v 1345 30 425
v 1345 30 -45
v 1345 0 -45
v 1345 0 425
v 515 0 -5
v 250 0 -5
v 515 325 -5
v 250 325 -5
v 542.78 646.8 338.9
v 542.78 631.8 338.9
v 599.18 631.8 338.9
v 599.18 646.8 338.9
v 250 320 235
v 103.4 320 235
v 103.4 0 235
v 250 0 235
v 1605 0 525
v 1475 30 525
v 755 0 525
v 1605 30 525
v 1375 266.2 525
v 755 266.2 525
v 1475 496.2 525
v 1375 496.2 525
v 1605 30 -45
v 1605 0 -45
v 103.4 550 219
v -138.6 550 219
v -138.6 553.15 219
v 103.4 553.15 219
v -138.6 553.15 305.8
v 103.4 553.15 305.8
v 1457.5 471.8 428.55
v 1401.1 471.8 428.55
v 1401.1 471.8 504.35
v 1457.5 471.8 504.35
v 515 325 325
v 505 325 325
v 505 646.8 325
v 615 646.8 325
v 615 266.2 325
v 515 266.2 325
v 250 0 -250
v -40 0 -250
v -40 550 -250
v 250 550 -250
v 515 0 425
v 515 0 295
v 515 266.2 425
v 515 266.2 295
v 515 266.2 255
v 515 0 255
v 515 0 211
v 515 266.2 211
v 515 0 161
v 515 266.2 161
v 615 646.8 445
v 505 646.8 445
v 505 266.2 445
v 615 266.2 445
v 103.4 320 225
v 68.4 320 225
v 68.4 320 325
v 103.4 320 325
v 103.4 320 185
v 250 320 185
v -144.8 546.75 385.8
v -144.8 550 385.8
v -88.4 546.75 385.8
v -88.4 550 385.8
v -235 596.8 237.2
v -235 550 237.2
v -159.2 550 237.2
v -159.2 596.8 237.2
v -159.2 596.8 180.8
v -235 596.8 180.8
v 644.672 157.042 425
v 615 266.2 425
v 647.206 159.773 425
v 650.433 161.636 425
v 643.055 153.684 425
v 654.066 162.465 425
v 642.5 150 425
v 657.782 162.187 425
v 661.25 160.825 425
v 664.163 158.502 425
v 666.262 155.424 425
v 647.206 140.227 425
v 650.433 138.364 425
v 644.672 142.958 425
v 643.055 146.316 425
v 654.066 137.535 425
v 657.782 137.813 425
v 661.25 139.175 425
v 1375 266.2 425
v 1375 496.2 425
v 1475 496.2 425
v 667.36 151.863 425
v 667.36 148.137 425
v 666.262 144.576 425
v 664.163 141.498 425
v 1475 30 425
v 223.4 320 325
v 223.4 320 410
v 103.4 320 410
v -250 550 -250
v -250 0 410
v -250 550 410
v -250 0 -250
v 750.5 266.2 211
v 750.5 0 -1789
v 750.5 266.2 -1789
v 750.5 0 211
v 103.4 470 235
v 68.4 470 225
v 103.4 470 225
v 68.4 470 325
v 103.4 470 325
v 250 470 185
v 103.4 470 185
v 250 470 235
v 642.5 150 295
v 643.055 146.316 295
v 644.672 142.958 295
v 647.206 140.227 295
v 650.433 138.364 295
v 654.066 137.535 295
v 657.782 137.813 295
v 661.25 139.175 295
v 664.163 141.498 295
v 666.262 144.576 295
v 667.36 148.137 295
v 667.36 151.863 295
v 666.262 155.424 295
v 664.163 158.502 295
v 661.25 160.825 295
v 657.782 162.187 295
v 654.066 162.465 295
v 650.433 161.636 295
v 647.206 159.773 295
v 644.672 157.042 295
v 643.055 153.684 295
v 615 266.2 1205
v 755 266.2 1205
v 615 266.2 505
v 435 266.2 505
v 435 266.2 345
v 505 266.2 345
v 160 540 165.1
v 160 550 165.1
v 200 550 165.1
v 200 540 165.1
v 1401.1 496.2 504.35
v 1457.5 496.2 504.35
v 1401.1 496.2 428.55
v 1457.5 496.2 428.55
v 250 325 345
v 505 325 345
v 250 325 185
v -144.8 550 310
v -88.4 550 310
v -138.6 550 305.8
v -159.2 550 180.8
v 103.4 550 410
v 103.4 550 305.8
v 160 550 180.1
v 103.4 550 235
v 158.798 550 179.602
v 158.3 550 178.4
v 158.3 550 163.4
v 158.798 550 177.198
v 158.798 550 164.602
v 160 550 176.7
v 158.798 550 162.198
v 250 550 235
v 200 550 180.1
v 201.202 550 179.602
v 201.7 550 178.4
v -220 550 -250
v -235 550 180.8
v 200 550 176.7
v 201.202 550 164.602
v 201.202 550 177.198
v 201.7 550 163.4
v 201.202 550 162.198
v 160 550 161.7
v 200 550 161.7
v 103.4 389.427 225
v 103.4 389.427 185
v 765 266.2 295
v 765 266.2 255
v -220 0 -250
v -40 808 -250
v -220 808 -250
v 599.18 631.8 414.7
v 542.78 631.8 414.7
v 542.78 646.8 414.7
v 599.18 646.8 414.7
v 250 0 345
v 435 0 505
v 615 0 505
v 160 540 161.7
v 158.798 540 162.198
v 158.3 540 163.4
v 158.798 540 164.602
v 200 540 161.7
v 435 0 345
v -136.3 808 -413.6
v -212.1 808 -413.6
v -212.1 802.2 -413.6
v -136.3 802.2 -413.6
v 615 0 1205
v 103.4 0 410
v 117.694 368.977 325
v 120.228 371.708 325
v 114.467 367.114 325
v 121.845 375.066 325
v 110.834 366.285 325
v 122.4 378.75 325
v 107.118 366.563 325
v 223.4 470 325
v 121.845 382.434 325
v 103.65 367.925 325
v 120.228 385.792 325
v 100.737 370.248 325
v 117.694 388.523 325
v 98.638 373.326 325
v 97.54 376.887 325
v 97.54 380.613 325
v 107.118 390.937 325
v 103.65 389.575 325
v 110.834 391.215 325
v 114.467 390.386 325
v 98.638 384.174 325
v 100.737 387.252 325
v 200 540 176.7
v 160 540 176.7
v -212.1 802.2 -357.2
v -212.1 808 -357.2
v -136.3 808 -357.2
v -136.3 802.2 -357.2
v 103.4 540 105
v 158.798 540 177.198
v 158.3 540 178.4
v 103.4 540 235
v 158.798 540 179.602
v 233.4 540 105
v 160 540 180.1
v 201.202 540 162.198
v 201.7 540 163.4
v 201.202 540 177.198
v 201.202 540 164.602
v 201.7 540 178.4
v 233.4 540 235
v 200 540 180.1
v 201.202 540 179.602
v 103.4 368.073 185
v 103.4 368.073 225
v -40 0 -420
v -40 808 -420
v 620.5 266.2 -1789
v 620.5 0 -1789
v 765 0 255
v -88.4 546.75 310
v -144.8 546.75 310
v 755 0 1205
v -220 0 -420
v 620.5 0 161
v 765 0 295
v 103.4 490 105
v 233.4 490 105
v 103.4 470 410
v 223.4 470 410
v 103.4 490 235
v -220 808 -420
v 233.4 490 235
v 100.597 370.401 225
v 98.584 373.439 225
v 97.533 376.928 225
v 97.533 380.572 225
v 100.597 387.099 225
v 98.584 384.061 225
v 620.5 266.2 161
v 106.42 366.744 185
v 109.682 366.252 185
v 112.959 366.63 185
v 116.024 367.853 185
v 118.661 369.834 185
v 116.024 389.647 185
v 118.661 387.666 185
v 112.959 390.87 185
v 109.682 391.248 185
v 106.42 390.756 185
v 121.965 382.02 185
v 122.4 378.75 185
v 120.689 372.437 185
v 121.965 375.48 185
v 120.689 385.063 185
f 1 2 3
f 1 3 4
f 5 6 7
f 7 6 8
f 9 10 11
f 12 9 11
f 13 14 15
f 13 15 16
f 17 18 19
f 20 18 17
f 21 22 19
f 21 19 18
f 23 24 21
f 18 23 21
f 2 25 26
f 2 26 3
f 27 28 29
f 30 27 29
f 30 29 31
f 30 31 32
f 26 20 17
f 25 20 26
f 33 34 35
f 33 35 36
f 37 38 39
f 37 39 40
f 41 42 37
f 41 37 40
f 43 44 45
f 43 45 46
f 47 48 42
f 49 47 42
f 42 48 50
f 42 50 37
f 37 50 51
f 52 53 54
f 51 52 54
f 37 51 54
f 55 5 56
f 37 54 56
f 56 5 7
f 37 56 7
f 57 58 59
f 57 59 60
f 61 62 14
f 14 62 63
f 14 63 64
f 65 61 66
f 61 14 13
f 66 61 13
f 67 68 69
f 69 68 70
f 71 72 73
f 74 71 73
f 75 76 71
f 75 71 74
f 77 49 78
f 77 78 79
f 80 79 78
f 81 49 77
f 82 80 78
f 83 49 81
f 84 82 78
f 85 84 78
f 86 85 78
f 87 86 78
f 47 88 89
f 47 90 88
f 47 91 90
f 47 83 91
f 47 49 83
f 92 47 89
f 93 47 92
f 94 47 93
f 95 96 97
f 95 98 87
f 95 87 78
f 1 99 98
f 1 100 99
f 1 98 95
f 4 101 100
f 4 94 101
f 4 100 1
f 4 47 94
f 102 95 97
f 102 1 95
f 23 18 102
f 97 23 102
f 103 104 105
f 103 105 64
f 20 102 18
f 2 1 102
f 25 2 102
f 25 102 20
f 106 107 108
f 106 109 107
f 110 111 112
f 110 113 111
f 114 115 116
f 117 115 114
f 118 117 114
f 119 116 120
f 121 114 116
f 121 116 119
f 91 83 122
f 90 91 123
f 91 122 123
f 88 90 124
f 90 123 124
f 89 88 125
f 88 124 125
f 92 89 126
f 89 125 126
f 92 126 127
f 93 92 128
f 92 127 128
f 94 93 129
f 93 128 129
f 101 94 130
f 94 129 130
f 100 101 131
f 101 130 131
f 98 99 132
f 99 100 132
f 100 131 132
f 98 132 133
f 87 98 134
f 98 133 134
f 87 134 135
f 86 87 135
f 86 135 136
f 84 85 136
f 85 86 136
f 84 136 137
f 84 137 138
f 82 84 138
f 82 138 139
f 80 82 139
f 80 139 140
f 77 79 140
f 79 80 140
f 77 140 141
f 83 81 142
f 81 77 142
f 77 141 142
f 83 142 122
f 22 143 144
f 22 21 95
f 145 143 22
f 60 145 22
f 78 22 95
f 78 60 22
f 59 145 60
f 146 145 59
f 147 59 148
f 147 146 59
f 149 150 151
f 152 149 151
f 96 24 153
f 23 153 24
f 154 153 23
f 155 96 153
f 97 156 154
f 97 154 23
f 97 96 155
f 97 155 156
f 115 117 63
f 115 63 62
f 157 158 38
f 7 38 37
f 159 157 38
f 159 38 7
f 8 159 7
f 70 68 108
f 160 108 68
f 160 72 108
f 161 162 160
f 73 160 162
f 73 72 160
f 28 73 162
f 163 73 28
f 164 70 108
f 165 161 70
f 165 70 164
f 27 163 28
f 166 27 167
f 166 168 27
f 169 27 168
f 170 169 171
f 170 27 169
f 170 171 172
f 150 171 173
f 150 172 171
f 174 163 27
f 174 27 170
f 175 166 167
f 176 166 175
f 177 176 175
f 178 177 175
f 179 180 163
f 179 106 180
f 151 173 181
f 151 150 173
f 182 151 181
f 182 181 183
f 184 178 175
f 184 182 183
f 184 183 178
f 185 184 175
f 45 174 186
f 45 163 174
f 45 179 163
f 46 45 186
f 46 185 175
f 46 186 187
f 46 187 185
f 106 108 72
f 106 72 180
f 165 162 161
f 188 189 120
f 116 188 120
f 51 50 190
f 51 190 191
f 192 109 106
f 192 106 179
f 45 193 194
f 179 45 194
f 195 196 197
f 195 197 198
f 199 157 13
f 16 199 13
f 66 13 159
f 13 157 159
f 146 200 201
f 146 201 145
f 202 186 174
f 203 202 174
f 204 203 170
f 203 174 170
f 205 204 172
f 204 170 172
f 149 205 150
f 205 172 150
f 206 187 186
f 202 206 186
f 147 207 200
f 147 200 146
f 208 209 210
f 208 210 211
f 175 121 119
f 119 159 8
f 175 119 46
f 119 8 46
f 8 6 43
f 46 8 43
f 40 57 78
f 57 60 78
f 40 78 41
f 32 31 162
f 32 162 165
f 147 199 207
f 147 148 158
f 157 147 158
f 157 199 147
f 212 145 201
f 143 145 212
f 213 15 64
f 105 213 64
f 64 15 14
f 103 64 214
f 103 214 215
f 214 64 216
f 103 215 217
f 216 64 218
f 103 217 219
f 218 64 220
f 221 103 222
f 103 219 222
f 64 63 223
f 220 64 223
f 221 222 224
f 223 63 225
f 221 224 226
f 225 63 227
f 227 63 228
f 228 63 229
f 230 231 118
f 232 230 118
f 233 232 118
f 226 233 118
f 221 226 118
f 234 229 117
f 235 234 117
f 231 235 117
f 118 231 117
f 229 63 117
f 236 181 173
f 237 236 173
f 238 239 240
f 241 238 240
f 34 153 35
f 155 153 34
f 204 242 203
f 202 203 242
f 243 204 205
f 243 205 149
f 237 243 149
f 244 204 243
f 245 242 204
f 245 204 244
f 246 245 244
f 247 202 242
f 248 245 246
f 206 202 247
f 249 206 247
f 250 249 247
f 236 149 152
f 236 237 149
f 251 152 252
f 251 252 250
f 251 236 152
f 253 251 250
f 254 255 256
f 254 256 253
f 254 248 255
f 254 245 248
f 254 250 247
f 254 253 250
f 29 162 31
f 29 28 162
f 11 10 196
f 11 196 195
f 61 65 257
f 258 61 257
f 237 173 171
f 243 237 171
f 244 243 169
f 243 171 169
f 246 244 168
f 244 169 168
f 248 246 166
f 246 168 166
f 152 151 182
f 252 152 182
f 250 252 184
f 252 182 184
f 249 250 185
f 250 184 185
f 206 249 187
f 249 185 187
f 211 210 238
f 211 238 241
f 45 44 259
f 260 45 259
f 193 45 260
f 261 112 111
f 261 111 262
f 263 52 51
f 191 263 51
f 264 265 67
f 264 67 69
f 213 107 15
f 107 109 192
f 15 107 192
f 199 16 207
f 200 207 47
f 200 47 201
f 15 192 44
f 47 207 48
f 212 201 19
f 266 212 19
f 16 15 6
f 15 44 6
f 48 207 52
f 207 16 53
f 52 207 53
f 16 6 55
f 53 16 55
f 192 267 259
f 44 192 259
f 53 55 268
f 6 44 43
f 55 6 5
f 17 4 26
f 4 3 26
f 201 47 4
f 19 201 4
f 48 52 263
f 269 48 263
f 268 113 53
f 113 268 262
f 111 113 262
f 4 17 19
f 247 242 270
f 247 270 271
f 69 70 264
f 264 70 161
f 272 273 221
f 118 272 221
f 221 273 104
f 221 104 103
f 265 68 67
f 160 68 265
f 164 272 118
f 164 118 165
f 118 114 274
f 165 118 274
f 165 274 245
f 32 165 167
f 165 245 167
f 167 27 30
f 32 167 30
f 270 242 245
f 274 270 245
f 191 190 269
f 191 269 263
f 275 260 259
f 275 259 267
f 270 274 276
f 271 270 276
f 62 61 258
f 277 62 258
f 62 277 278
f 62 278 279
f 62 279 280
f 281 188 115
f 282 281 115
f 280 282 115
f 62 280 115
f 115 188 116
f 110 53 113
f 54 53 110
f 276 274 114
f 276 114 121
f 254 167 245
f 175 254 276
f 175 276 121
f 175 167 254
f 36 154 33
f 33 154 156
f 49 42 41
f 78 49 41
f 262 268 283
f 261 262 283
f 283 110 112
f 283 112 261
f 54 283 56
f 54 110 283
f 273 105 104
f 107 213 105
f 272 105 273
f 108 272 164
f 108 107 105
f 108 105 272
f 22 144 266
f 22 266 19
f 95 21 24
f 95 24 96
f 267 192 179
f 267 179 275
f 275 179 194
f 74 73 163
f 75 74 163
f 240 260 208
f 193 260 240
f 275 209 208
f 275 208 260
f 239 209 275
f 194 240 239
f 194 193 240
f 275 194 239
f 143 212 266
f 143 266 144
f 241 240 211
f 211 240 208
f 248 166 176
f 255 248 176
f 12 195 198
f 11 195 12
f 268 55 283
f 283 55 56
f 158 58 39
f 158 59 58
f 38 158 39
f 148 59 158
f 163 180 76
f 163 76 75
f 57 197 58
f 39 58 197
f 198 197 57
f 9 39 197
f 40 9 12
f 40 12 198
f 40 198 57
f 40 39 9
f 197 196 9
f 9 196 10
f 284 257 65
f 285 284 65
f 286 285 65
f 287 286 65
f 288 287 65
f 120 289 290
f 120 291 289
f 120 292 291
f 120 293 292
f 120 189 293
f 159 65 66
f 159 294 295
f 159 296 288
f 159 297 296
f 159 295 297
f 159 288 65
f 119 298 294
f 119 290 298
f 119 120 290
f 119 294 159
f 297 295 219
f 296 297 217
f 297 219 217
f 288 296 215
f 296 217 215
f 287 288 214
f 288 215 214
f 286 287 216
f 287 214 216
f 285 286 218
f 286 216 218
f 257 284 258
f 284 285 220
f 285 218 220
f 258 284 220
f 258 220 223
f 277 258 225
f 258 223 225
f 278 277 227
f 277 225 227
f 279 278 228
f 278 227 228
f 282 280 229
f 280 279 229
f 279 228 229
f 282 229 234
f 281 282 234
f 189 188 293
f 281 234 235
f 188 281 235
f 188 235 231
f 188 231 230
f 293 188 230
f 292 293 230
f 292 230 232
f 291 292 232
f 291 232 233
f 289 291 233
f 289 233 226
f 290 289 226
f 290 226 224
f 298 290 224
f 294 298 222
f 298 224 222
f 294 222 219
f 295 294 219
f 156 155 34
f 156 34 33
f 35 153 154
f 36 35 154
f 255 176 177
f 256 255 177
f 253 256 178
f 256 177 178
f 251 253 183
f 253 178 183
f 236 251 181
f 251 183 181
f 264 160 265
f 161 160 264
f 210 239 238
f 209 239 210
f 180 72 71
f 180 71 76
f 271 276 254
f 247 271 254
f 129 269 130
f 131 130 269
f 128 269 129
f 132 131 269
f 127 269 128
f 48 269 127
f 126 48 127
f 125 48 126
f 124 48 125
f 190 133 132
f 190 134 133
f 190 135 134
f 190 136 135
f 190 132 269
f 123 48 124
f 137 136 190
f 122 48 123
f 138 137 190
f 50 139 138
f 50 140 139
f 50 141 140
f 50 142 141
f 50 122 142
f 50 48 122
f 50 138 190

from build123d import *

# Parameters (mm, degrees)
SKETCH1_W            = 500
SKETCH1_H            = 500
BOSS_EXTRUDE1_DEPTH  = 550
SKETCH2_W            = 75.8
SKETCH2_H            = 56.4
BOSS_EXTRUDE2_DEPTH  = 46.8
SKETCH5_W            = 31
SKETCH5_H            = 3.15
BOSS_EXTRUDE4_DEPTH  = 242
SKETCH6_W            = 146.6
SKETCH6_H            = 15
CUT_EXTRUDE2_DEPTH   = 654.834841531
SKETCH7_W            = 353.4
SKETCH7_H            = 550
BOSS_EXTRUDE5_DEPTH  = 160
SKETCH8_W            = 242
SKETCH8_H            = 3.15
BOSS_EXTRUDE6_DEPTH  = 55.8
SKETCH9_W            = 56.4
SKETCH9_H            = 75.8
CUT_EXTRUDE3_DEPTH   = 3.25
CUT_EXTRUDE6_DEPTH   = 10
SKETCH13_W           = 130
SKETCH13_H           = 50
CUT_EXTRUDE7_DEPTH   = 130
LPATTERN1_COUNT      = 2
LPATTERN1_PITCH      = 15
SKETCH14_W           = 146.6
SKETCH14_H           = 150
CUT_EXTRUDE8_DEPTH   = 50
SKETCH15_W           = 350
SKETCH15_H           = 325
BOSS_EXTRUDE7_DEPTH  = 265
SKETCH16_W           = 50
SKETCH16_H           = 266.2
BOSS_EXTRUDE8_DEPTH  = 235.5
SKETCH17_W           = 130
SKETCH17_H           = 266.2
BOSS_EXTRUDE9_DEPTH  = 1950
SKETCH18_W           = 80
SKETCH18_H           = 266.2
BOSS_EXTRUDE10_DEPTH = 160
SKETCH19_W           = 780
SKETCH19_H           = 266.2
BOSS_EXTRUDE11_DEPTH = 240
SKETCH20_W           = 700
SKETCH20_H           = 266.2
CUT_EXTRUDE9_DEPTH   = 100
SKETCH21_W           = 100
SKETCH21_H           = 266.2
BOSS_EXTRUDE12_DEPTH = 720
SKETCH22_W           = 100
SKETCH22_H           = 100
BOSS_EXTRUDE14_DEPTH = 230
SKETCH23_W           = 56.4
SKETCH23_H           = 75.8
CUT_EXTRUDE10_DEPTH  = 24.4
SKETCH24_W           = 40
SKETCH24_H           = 266.2
BOSS_EXTRUDE15_DEPTH = 250
BOSS_EXTRUDE16_REACH = 2623.994
SKETCH25_R           = 12.5
SKETCH26_W           = 110
SKETCH26_H           = 120
BOSS_EXTRUDE22_DEPTH = 365.6
SKETCH28_W           = 110
SKETCH28_H           = 120
SKETCH28_W_2         = 56.4
SKETCH28_H_2         = 75.8
BOSS_EXTRUDE23_DEPTH = 15
SKETCH29_W           = 100
SKETCH29_H           = 150
CUT_EXTRUDE11_DEPTH  = 35
SKETCH30_W           = 85
SKETCH30_H           = 150
BOSS_EXTRUDE24_DEPTH = 120
BOSS_EXTRUDE25_REACH = 2659.625
SKETCH31_R           = 12.5
SKETCH32_W           = 220
SKETCH32_H           = 550
BOSS_EXTRUDE26_DEPTH = 30
SKETCH34_W           = 180
SKETCH34_H           = 808
BOSS_EXTRUDE28_DEPTH = 170
SKETCH35_W           = 75.8
SKETCH35_H           = 56.4
CUT_EXTRUDE12_DEPTH  = 5.8
BOSS_EXTRUDE29_DEPTH = 30


with BuildPart() as part:
    # Sketch1 → Boss-Extrude1 (new body)
    with BuildSketch(Plane(origin=(0, 0, 0), x_dir=(1, 0, 0), z_dir=(0, 1, 0))):
        Rectangle(SKETCH1_W, SKETCH1_H)
    extrude(amount=BOSS_EXTRUDE1_DEPTH)

    # Sketch2 → Boss-Extrude2 (add)
    with BuildSketch(Plane(origin=(0, 550, 0), x_dir=(1, 0, 0), z_dir=(0, 1, 0))):
        with Locations((-197.1, -209)):
            Rectangle(SKETCH2_W, SKETCH2_H)
    extrude(amount=BOSS_EXTRUDE2_DEPTH)

    # Sketch5 → Boss-Extrude4 (add)
    with BuildSketch(Plane(origin=(-138.6, 0, 0), x_dir=(0, 0, -1), z_dir=(1, 0, 0))):
        with Locations((-234.5, 551.575)):
            Rectangle(SKETCH5_W, SKETCH5_H)
    extrude(amount=BOSS_EXTRUDE4_DEPTH)

    # Sketch6 → Cut-Extrude2 (cut, through all)
    with BuildSketch(Plane(origin=(0, 550, 0), x_dir=(1, 0, 0), z_dir=(0, 1, 0))):
        with Locations((176.7, -242.5)):
            Rectangle(SKETCH6_W, SKETCH6_H)
    extrude(amount=-CUT_EXTRUDE2_DEPTH, mode=Mode.SUBTRACT)

    # Sketch7 → Boss-Extrude5 (add)
    with BuildSketch(Plane.XY.offset(250)):
        with Locations((-73.3, 275)):
            Rectangle(SKETCH7_W, SKETCH7_H)
    extrude(amount=BOSS_EXTRUDE5_DEPTH)

    # Sketch8 → Boss-Extrude6 (add)
    with BuildSketch(Plane.XY.offset(250)):
        with Locations((-17.6, 551.575)):
            Rectangle(SKETCH8_W, SKETCH8_H)
    extrude(amount=BOSS_EXTRUDE6_DEPTH)

    # Sketch9 → Cut-Extrude3 (cut)
    with BuildSketch(Plane(origin=(0, 550, 0), x_dir=(1, 0, 0), z_dir=(0, 1, 0))):
        with Locations((-116.6, -347.9)):
            Rectangle(SKETCH9_W, SKETCH9_H)
    extrude(amount=-CUT_EXTRUDE3_DEPTH, mode=Mode.SUBTRACT)

    # Sketch12 → Cut-Extrude6 (cut)
    with BuildSketch(Plane(origin=(0, 550, 0), x_dir=(1, 0, 0), z_dir=(0, 1, 0))):
        with BuildLine():
            Line((200, -176.7), (160, -176.7))
            ThreePointArc((160, -176.7), (158.3, -178.4), (160, -180.1))
            Line((160, -180.1), (200, -180.1))
            ThreePointArc((200, -180.1), (201.7, -178.4), (200, -176.7))
        make_face()
    cut_extrude6 = extrude(amount=-CUT_EXTRUDE6_DEPTH, mode=Mode.SUBTRACT)

    # Sketch13 → Cut-Extrude7 (cut)
    with BuildSketch(Plane.XY.offset(235)):
        with Locations((168.4, 515)):
            Rectangle(SKETCH13_W, SKETCH13_H)
    extrude(amount=-CUT_EXTRUDE7_DEPTH, mode=Mode.SUBTRACT)

    # LPattern1: Cut-Extrude6 ×2
    with Locations(*[(0, 0, -i * LPATTERN1_PITCH) for i in range(1, LPATTERN1_COUNT)]):
        add(cut_extrude6, mode=Mode.SUBTRACT)

    # Sketch14 → Cut-Extrude8 (cut)
    with BuildSketch(Plane.XY.offset(235)):
        with Locations((176.7, 395)):
            Rectangle(SKETCH14_W, SKETCH14_H)
    extrude(amount=-CUT_EXTRUDE8_DEPTH, mode=Mode.SUBTRACT)

    # Sketch15 → Boss-Extrude7 (add)
    with BuildSketch(Plane(origin=(250, 0, 0), x_dir=(0, 0, -1), z_dir=(1, 0, 0))):
        with Locations((-170, 162.5)):
            Rectangle(SKETCH15_W, SKETCH15_H)
    extrude(amount=BOSS_EXTRUDE7_DEPTH)

    # Sketch16 → Boss-Extrude8 (add)
    with BuildSketch(Plane(origin=(515, 0, 0), x_dir=(0, 0, -1), z_dir=(1, 0, 0))):
        with Locations((-186, 133.1)):
            Rectangle(SKETCH16_W, SKETCH16_H)
    extrude(amount=BOSS_EXTRUDE8_DEPTH)

    # Sketch17 → Boss-Extrude9 (add)
    with BuildSketch(Plane(origin=(0, 0, 161), x_dir=(-1, 0, 0), z_dir=(0, 0, -1))):
        with Locations((-685.5, 133.1)):
            Rectangle(SKETCH17_W, SKETCH17_H)
    extrude(amount=BOSS_EXTRUDE9_DEPTH)

    # Sketch18 → Boss-Extrude10 (add)
    with BuildSketch(Plane.XY.offset(345)):
        with Locations((475, 133.1)):
            Rectangle(SKETCH18_W, SKETCH18_H)
    extrude(amount=BOSS_EXTRUDE10_DEPTH)

    # Sketch19 → Boss-Extrude11 (add)
    with BuildSketch(Plane(origin=(515, 0, 0), x_dir=(0, 0, -1), z_dir=(1, 0, 0))):
        with Locations((-815, 133.1)):
            Rectangle(SKETCH19_W, SKETCH19_H)
    extrude(amount=BOSS_EXTRUDE11_DEPTH)

    # Sketch20 → Cut-Extrude9 (cut)
    with BuildSketch(Plane.ZY.offset(-515)):
        with Locations((855, 133.1)):
            Rectangle(SKETCH20_W, SKETCH20_H)
    extrude(amount=-CUT_EXTRUDE9_DEPTH, mode=Mode.SUBTRACT)

    # Sketch21 → Boss-Extrude12 (add)
    with BuildSketch(Plane(origin=(755, 0, 0), x_dir=(0, 0, -1), z_dir=(1, 0, 0))):
        with Locations((-475, 133.1)):
            Rectangle(SKETCH21_W, SKETCH21_H)
    extrude(amount=BOSS_EXTRUDE12_DEPTH)

    # Sketch22 → Boss-Extrude14 (add)
    with BuildSketch(Plane(origin=(0, 266.2, 0), x_dir=(1, 0, 0), z_dir=(0, 1, 0))):
        with Locations((1425, -475)):
            Rectangle(SKETCH22_W, SKETCH22_H)
    extrude(amount=BOSS_EXTRUDE14_DEPTH)

    # Sketch23 → Cut-Extrude10 (cut)
    with BuildSketch(Plane(origin=(0, 496.2, 0), x_dir=(1, 0, 0), z_dir=(0, 1, 0))):
        with Locations((1429.3, -466.45)):
            Rectangle(SKETCH23_W, SKETCH23_H)
    extrude(amount=-CUT_EXTRUDE10_DEPTH, mode=Mode.SUBTRACT)

    # Sketch24 → Boss-Extrude15 (add)
    with BuildSketch(Plane(origin=(515, 0, 0), x_dir=(0, 0, -1), z_dir=(1, 0, 0))):
        with Locations((-275, 133.1)):
            Rectangle(SKETCH24_W, SKETCH24_H)
    extrude(amount=BOSS_EXTRUDE15_DEPTH)

    # Sketch25 → Boss-Extrude16 (add, up to next)
    with BuildSketch(Plane.XY.offset(295), mode=Mode.PRIVATE) as boss_extrude16_sk1:
        with Locations(Location((655, 150, 0), (0, 0, 180))):
            Circle(SKETCH25_R)
    boss_extrude16_tool1 = extrude(boss_extrude16_sk1.sketch, amount=BOSS_EXTRUDE16_REACH, mode=Mode.PRIVATE) - part.part
    add(boss_extrude16_tool1.solids().sort_by_distance((655, 150, 295))[0])

    # Sketch26 → Boss-Extrude22 (add)
    with BuildSketch(Plane(origin=(0, 266.2, 0), x_dir=(1, 0, 0), z_dir=(0, 1, 0))):
        with Locations((560, -385)):
            Rectangle(SKETCH26_W, SKETCH26_H)
    extrude(amount=BOSS_EXTRUDE22_DEPTH)

    # Sketch28 → Boss-Extrude23 (add)
    with BuildSketch(Plane(origin=(0, 631.8, 0), x_dir=(1, 0, 0), z_dir=(0, 1, 0))):
        with Locations((560, -385)):
            Rectangle(SKETCH28_W, SKETCH28_H)
        with Locations((570.98, -376.8)):
            Rectangle(SKETCH28_W_2, SKETCH28_H_2, mode=Mode.SUBTRACT)
    extrude(amount=BOSS_EXTRUDE23_DEPTH)

    # Sketch29 → Cut-Extrude11 (cut)
    with BuildSketch(Plane(origin=(103.4, 0, 0), x_dir=(0, 0, -1), z_dir=(1, 0, 0))):
        with Locations((-275, 395)):
            Rectangle(SKETCH29_W, SKETCH29_H)
    extrude(amount=-CUT_EXTRUDE11_DEPTH, mode=Mode.SUBTRACT)

    # Sketch30 → Boss-Extrude24 (add)
    with BuildSketch(Plane(origin=(103.4, 0, 0), x_dir=(0, 0, -1), z_dir=(1, 0, 0))):
        with Locations((-367.5, 395)):
            Rectangle(SKETCH30_W, SKETCH30_H)
    extrude(amount=BOSS_EXTRUDE24_DEPTH)

    # Sketch31 → Boss-Extrude25 (add, up to next)
    with BuildSketch(Plane(origin=(0, 0, 325), x_dir=(-1, 0, 0), z_dir=(0, 0, -1)), mode=Mode.PRIVATE) as boss_extrude25_sk1:
        with Locations(Location((-109.9, 378.75, 0), (0, 0, 180))):
            Circle(SKETCH31_R)
    boss_extrude25_tool1 = extrude(boss_extrude25_sk1.sketch, amount=BOSS_EXTRUDE25_REACH, mode=Mode.PRIVATE) - part.part
    add(boss_extrude25_tool1.solids().sort_by_distance((109.9, 378.75, 325))[0])

    # Sketch32 → Boss-Extrude26 (add)
    with BuildSketch(Plane.XZ):
        with Locations((1475, 250)):
            Rectangle(SKETCH32_W, SKETCH32_H)
    extrude(amount=-BOSS_EXTRUDE26_DEPTH)

    # Sketch34 → Boss-Extrude28 (add)
    with BuildSketch(Plane(origin=(0, 0, -250), x_dir=(-1, 0, 0), z_dir=(0, 0, -1))):
        with Locations((130, 404)):
            Rectangle(SKETCH34_W, SKETCH34_H)
    extrude(amount=BOSS_EXTRUDE28_DEPTH)

    # Sketch35 → Cut-Extrude12 (cut)
    with BuildSketch(Plane(origin=(0, 808, 0), x_dir=(1, 0, 0), z_dir=(0, 1, 0))):
        with Locations((-174.2, 385.4)):
            Rectangle(SKETCH35_W, SKETCH35_H)
    extrude(amount=-CUT_EXTRUDE12_DEPTH, mode=Mode.SUBTRACT)

    # Sketch36 → Boss-Extrude29 (add)
    with BuildSketch(Plane(origin=(0, 30, 0), x_dir=(1, 0, 0), z_dir=(0, 1, 0))):
        Polygon((1365, -425), (1365, 25), (1585, 25), (1585, -525), (1605, -525), (1605, 45), (1345, 45), (1345, -425), align=None)
    extrude(amount=-BOSS_EXTRUDE29_DEPTH)


solid = part.part
